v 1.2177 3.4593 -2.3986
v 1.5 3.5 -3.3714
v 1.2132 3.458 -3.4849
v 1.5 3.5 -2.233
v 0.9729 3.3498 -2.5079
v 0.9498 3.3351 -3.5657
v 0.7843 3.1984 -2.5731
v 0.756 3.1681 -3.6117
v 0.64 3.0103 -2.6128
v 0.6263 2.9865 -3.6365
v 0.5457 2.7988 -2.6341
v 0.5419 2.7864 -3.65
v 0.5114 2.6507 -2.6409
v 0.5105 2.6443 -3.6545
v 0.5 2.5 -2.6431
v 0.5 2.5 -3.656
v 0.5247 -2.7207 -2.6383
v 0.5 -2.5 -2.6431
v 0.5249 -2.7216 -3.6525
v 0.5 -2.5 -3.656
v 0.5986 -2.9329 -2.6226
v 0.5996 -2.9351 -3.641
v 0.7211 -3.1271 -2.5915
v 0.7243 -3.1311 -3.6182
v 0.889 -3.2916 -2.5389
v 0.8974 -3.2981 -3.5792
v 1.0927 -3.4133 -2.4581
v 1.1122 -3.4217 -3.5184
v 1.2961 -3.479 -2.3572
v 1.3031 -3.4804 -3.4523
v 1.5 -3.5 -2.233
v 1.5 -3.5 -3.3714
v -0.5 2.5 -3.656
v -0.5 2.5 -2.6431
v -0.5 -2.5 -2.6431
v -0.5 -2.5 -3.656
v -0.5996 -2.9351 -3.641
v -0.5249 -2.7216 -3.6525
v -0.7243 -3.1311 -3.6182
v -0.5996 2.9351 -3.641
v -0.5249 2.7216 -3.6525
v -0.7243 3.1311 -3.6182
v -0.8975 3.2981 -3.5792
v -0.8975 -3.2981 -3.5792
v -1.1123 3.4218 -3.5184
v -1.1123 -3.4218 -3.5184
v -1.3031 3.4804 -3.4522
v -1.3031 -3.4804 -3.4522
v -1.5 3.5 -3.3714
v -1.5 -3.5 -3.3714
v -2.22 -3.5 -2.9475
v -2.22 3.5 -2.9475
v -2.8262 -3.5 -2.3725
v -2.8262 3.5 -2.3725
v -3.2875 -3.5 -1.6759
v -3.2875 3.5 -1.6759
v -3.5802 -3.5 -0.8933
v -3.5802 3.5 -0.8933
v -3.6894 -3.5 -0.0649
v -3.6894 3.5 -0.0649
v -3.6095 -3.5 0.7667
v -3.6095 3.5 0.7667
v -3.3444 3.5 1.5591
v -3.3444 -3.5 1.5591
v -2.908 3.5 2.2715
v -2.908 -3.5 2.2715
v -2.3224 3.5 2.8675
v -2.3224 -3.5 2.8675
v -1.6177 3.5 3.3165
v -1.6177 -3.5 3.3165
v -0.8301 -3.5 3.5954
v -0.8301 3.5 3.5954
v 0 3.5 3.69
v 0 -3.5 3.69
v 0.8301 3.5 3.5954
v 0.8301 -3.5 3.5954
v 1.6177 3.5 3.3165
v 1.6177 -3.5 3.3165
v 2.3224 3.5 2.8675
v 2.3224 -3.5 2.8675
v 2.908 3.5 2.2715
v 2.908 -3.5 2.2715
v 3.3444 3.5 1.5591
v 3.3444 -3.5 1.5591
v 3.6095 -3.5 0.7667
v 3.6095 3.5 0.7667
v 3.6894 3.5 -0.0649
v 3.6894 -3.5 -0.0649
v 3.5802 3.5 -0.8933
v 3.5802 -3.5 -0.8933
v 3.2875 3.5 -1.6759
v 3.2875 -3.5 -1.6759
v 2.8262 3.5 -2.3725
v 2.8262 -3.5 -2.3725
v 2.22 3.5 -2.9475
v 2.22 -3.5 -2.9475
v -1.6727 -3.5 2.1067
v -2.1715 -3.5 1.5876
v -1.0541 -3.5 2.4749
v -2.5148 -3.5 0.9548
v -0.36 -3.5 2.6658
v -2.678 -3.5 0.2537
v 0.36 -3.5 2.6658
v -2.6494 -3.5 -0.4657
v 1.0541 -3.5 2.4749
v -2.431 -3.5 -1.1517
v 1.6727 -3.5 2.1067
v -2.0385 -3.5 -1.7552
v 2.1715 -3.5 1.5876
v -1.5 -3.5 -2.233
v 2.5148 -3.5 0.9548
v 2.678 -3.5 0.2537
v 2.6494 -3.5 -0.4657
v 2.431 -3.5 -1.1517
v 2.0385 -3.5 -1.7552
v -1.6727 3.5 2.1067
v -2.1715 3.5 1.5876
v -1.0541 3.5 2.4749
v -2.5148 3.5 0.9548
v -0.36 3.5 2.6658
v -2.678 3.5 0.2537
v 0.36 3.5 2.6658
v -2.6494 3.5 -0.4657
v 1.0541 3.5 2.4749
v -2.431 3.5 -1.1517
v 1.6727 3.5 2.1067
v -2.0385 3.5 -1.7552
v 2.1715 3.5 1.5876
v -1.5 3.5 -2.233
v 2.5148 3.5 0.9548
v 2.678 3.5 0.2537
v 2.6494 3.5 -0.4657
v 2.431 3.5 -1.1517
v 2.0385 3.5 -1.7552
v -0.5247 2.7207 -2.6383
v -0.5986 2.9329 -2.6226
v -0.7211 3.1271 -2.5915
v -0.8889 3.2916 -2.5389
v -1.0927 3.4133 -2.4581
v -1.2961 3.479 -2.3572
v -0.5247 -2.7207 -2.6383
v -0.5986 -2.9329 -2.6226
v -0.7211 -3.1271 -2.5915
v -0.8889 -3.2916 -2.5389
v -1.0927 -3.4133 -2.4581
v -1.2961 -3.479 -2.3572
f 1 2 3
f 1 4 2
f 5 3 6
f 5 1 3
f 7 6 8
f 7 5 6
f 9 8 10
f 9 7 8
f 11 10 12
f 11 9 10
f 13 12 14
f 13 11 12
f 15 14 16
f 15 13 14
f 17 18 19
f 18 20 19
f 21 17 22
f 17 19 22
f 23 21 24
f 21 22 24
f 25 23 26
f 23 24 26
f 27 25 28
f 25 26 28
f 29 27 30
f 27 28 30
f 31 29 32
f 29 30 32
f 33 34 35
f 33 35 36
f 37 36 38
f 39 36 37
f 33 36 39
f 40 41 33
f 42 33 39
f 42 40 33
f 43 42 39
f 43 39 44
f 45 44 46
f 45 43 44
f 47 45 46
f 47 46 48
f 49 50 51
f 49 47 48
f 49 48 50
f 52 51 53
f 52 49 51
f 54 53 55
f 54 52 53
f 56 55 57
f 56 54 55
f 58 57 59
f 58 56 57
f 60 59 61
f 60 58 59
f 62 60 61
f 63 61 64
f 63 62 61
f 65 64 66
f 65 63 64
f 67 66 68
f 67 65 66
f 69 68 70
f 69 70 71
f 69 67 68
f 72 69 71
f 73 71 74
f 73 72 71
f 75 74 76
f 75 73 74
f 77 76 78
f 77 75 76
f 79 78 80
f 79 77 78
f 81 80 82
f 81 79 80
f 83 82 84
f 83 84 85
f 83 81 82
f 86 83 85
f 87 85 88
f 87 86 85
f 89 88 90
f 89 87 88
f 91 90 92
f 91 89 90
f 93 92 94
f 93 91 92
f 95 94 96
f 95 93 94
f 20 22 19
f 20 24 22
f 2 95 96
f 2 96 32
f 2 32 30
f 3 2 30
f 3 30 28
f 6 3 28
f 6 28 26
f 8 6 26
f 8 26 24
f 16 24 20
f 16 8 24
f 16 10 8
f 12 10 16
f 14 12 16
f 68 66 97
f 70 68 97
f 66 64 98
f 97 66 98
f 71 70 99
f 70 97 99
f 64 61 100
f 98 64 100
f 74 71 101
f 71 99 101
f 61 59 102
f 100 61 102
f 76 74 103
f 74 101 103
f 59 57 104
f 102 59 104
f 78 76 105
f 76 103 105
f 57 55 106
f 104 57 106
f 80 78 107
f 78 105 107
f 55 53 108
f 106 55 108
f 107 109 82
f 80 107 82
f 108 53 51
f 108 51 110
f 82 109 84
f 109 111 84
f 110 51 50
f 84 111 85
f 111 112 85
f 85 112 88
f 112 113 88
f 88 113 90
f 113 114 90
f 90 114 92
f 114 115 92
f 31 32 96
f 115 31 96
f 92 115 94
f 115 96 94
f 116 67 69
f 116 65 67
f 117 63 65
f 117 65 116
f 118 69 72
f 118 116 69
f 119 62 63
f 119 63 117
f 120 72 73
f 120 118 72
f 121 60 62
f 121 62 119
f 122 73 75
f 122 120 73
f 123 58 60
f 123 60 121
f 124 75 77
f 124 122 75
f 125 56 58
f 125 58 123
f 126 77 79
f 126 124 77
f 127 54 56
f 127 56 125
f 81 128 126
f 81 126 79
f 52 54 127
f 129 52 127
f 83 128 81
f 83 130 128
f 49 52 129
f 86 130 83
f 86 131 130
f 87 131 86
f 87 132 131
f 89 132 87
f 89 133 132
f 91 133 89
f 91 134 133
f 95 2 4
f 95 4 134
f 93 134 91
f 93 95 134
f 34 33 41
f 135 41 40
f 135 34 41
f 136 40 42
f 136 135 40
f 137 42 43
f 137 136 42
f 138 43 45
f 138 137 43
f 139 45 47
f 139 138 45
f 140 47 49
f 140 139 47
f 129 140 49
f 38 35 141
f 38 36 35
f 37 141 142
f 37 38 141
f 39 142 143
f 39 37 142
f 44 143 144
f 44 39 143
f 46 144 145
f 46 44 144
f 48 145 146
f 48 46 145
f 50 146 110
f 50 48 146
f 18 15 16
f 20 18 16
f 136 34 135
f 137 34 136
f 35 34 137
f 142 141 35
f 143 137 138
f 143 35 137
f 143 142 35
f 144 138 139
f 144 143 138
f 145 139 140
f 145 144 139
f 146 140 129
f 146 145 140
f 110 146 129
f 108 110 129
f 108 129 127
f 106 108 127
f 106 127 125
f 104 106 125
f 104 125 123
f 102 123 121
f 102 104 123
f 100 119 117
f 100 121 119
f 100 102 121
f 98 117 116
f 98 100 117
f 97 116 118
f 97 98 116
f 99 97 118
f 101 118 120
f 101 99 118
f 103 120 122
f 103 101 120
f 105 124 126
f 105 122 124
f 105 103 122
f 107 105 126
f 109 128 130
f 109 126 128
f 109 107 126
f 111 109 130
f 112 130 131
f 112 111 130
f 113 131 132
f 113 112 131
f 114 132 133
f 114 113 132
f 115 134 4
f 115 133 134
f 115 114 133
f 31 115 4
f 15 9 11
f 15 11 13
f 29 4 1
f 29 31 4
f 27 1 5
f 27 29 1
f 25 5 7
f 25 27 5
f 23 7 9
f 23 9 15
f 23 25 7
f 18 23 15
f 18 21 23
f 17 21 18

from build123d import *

# Parameters (mm, degrees)
SKETCH3_R               = 3.69
SKETCH3_R_2             = 2.69
EXTRUDE_THIN1_DEPTH     = 3.5
SKETCH4_W               = 1
SKETCH4_H               = 1000
CUT_EXTRUDE1_DEPTH      = 4.5
CUT_EXTRUDE1_DEPTH_BACK = 4.5
FILLET1_R               = 1


with BuildPart() as part:
    # Sketch3 → Extrude-Thin1 (new body, symmetric)
    with BuildSketch(Plane(origin=(0, 0, 0), x_dir=(1, 0, 0), z_dir=(0, 1, 0))):
        Circle(SKETCH3_R)
        Circle(SKETCH3_R_2, mode=Mode.SUBTRACT)
    extrude(amount=EXTRUDE_THIN1_DEPTH, both=True)

    # Sketch4 → Cut-Extrude1 (cut, two sides)
    with BuildSketch(Plane(origin=(0, 0, 0), x_dir=(1, 0, 0), z_dir=(0, 1, 0))) as cut_extrude1_sk:
        with Locations((0, 500)):
            Rectangle(SKETCH4_W, SKETCH4_H)
    extrude(amount=CUT_EXTRUDE1_DEPTH, mode=Mode.SUBTRACT)
    extrude(cut_extrude1_sk.sketch, amount=-CUT_EXTRUDE1_DEPTH_BACK, mode=Mode.SUBTRACT)

    # Fillet1
    fillet1_edges = [part.edges().sort_by_distance(p)[0] for p in [
        (0.5, -3.5, -3.149545438),
        (-0.5, -3.5, -3.149545438),
        (0.5, 3.5, -3.149545438),
        (-0.5, 3.5, -3.149545438),
    ]]
    fillet(fillet1_edges, radius=FILLET1_R)


solid = part.part
